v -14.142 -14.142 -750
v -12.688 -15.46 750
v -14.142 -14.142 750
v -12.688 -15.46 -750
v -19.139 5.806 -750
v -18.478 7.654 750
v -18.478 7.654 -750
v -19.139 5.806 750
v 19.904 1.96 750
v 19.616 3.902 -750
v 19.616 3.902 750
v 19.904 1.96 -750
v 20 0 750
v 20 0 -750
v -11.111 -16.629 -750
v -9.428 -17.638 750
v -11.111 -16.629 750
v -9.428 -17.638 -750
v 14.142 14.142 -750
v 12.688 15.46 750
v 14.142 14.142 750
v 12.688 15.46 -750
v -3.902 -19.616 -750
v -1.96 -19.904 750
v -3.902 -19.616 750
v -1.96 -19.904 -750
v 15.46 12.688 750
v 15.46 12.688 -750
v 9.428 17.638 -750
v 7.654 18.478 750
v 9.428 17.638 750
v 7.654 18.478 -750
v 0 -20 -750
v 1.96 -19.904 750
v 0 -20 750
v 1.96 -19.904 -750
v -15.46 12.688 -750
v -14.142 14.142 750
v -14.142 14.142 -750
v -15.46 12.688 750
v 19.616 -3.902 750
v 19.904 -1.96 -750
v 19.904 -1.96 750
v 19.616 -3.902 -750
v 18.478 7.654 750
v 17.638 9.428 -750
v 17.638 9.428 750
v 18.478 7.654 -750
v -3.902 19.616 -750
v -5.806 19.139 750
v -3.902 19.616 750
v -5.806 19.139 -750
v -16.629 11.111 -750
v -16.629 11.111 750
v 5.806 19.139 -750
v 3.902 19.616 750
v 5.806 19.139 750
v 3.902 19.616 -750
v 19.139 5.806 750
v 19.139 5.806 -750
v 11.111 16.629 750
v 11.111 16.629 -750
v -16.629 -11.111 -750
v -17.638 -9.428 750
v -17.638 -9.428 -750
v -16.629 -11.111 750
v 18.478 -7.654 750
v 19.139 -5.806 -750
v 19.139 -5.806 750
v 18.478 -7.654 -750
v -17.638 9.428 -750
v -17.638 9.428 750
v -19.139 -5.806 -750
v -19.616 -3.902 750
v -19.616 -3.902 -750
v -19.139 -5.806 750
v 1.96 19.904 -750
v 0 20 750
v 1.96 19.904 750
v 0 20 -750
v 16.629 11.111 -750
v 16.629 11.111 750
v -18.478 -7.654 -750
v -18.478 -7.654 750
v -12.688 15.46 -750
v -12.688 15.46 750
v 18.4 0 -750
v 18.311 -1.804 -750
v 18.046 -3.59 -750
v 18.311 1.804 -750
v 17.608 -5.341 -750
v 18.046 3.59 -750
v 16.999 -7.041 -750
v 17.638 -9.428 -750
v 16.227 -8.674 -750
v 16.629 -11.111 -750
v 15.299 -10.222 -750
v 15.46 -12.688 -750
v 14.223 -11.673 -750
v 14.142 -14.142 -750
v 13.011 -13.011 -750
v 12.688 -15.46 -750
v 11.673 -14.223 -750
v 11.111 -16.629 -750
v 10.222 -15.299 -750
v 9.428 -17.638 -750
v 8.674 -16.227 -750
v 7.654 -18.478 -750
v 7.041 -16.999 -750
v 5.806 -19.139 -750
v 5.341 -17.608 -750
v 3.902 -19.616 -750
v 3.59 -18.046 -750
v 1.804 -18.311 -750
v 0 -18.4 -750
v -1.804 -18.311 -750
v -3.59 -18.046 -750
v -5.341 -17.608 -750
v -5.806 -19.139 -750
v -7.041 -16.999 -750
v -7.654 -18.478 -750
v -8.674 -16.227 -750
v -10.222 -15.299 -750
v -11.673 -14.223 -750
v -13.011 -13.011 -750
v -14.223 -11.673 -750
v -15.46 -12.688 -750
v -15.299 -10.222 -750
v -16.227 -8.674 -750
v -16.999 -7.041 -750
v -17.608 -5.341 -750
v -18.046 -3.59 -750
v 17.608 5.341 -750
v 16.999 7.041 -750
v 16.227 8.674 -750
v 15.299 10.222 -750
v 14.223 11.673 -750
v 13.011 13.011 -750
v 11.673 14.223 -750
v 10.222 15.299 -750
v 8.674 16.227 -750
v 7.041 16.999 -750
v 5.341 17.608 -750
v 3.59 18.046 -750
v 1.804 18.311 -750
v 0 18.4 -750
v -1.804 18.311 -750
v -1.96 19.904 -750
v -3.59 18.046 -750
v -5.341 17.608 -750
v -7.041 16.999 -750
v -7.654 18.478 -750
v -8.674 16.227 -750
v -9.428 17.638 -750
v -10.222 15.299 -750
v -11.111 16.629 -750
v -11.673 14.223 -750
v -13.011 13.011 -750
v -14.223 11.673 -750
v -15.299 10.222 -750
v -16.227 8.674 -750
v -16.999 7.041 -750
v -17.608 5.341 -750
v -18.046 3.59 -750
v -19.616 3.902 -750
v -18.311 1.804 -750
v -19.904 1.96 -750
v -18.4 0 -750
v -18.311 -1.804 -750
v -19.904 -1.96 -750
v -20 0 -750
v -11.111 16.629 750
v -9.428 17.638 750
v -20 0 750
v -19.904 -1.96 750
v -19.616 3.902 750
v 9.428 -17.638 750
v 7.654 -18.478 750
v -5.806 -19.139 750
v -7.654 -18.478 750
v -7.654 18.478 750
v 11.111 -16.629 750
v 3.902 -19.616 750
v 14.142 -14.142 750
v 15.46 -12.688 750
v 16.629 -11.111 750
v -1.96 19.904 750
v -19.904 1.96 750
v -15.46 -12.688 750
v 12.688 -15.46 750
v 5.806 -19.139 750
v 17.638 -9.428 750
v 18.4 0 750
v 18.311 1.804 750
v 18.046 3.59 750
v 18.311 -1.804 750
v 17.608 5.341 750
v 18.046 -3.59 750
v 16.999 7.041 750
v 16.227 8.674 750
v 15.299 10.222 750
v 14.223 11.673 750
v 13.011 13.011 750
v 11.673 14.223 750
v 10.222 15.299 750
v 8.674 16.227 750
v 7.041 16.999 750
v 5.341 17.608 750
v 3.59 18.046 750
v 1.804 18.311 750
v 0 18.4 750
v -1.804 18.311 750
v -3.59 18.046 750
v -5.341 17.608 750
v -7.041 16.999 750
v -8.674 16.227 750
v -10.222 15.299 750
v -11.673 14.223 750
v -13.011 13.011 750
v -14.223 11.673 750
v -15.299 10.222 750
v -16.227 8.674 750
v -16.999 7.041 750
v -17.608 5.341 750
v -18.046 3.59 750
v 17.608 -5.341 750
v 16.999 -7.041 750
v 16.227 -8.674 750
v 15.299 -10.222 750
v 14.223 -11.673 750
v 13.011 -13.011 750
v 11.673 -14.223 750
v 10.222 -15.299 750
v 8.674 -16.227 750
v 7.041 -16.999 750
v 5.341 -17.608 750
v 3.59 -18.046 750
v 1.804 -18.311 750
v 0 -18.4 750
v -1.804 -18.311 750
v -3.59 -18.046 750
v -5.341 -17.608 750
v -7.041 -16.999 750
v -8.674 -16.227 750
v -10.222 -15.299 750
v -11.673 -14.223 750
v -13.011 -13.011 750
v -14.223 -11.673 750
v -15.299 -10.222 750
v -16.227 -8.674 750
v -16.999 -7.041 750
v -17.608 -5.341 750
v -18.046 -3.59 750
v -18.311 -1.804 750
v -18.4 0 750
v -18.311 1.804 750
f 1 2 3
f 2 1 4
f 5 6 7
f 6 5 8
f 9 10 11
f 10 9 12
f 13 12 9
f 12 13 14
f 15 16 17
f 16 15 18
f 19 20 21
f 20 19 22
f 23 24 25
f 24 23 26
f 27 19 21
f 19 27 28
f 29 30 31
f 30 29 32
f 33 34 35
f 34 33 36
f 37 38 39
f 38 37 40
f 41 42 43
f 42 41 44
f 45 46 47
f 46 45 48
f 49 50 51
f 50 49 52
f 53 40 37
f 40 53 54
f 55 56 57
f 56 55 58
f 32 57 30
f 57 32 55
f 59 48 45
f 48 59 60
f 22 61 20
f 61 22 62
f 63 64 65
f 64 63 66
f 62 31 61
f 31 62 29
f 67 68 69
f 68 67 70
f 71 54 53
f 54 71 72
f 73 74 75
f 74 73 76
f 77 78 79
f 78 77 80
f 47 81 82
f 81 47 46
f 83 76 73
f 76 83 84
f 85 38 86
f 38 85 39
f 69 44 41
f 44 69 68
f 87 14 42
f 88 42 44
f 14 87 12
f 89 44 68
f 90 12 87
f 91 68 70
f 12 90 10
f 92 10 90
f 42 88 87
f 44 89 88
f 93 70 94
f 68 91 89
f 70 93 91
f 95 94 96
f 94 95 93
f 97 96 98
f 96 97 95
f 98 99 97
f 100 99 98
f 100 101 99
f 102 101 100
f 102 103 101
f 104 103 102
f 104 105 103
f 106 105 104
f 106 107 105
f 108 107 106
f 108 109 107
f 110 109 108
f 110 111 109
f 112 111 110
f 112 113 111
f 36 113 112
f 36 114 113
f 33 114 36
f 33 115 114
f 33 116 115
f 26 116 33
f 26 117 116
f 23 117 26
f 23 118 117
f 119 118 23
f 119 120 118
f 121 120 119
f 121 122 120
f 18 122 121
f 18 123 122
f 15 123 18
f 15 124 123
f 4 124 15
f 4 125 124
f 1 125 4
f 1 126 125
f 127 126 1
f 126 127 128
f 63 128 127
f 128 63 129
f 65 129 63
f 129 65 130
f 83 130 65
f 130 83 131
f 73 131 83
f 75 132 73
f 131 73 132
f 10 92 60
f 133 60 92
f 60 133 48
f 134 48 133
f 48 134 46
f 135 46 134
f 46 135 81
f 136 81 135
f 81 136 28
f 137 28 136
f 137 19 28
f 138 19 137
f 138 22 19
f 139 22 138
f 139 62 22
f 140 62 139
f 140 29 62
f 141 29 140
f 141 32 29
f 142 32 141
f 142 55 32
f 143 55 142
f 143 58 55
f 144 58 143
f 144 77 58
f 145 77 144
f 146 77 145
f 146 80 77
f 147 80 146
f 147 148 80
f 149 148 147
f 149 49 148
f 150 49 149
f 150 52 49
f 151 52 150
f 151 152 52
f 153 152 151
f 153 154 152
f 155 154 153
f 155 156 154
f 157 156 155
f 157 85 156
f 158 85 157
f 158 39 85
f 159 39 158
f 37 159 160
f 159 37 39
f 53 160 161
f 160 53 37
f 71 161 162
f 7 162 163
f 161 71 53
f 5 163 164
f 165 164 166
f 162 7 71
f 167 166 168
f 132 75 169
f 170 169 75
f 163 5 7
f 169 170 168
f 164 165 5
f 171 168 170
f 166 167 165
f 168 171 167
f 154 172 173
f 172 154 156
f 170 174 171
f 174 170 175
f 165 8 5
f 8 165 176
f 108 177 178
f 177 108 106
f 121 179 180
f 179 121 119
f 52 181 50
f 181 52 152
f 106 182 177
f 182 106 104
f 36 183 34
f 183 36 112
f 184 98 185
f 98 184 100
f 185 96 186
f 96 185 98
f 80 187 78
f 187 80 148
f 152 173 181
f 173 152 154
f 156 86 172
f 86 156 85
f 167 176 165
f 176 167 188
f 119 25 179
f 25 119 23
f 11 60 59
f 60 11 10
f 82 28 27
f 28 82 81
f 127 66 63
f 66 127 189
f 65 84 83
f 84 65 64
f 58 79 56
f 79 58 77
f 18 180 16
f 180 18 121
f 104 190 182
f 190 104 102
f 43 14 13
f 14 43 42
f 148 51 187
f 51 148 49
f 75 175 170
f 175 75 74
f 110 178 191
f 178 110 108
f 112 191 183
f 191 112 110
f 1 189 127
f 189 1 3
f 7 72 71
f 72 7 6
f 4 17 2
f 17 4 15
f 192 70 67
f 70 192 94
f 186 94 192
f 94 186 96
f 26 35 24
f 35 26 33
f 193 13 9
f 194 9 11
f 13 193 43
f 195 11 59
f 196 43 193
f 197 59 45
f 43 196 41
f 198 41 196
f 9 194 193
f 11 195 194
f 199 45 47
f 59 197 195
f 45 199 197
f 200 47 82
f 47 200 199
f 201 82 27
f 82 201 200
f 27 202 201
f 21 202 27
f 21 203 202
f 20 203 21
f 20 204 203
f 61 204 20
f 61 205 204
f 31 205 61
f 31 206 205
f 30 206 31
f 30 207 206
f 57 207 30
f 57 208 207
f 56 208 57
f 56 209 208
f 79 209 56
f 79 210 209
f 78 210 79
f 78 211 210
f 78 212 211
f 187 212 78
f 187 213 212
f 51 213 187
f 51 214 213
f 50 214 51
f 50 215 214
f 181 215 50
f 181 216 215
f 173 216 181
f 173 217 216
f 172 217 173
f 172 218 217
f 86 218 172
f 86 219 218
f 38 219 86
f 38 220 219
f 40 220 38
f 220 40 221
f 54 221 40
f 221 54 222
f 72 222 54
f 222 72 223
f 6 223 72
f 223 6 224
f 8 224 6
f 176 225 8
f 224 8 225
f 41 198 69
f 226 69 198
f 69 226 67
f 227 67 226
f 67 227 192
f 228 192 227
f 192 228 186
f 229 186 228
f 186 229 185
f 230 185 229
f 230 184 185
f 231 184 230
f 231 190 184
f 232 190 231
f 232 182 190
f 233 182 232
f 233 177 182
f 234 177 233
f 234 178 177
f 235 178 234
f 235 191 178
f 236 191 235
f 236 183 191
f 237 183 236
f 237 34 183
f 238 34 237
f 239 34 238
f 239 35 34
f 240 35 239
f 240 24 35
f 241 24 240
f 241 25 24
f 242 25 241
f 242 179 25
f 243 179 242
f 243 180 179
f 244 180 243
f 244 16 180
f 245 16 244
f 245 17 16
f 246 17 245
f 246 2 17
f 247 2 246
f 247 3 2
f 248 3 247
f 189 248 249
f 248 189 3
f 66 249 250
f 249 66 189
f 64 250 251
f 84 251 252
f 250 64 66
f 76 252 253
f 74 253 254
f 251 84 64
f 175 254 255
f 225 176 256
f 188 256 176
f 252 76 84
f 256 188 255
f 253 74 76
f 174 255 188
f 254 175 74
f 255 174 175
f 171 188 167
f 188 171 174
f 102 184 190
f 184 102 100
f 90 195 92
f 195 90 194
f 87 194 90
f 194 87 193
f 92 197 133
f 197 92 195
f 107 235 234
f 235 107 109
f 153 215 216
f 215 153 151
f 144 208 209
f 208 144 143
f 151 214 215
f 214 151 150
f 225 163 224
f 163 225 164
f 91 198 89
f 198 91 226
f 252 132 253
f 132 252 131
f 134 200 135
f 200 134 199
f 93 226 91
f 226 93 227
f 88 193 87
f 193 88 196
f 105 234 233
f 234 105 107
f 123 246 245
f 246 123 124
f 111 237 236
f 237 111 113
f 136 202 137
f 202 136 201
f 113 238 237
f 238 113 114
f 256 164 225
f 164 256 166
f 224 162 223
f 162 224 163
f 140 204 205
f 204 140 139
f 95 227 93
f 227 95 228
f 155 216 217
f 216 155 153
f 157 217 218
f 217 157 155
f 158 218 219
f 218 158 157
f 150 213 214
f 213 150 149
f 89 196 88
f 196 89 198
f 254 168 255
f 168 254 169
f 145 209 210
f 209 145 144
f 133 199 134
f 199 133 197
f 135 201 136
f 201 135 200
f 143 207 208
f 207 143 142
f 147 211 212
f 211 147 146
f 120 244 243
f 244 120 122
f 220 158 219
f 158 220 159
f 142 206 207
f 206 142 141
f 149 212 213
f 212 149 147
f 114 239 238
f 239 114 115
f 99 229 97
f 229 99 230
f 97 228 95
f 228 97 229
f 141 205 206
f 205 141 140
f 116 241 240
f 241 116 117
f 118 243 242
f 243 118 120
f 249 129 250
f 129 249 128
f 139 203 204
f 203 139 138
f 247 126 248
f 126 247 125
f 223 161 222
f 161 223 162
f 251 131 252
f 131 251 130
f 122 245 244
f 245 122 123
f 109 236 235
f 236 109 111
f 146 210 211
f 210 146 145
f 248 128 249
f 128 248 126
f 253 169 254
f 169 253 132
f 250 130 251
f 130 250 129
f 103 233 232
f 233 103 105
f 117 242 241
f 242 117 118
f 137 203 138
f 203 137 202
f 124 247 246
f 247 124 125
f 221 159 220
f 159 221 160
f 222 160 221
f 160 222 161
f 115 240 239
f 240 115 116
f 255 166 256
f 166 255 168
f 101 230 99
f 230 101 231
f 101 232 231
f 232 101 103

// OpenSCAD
// Parameters
length_mm = 1500; //[750:3000:10]
ht40_outer_diameter_mm = 40; //[30:80:1]
ht40_wall_thickness_mm = 1.8; //[1:4:0.1]
bore_clearance_mm = 0.2; //[0:1:0.05]

// Module for HT Pipe
module ht_pipe() {
  color([0.85, 0.85, 0.8]) { // PVC color
    difference() {
      // Outer pipe segment
      cylinder(h=length_mm, r=ht40_outer_diameter_mm/2, center=true, $fn=64);
      
      // Inner hollow bore
      cylinder(h=length_mm + 2*bore_clearance_mm, 
               r=ht40_outer_diameter_mm/2 - ht40_wall_thickness_mm + bore_clearance_mm, 
               center=true, $fn=64);
    }
  }
}

// Assembly
module assembly() {
  ht_pipe();
}

assembly();
